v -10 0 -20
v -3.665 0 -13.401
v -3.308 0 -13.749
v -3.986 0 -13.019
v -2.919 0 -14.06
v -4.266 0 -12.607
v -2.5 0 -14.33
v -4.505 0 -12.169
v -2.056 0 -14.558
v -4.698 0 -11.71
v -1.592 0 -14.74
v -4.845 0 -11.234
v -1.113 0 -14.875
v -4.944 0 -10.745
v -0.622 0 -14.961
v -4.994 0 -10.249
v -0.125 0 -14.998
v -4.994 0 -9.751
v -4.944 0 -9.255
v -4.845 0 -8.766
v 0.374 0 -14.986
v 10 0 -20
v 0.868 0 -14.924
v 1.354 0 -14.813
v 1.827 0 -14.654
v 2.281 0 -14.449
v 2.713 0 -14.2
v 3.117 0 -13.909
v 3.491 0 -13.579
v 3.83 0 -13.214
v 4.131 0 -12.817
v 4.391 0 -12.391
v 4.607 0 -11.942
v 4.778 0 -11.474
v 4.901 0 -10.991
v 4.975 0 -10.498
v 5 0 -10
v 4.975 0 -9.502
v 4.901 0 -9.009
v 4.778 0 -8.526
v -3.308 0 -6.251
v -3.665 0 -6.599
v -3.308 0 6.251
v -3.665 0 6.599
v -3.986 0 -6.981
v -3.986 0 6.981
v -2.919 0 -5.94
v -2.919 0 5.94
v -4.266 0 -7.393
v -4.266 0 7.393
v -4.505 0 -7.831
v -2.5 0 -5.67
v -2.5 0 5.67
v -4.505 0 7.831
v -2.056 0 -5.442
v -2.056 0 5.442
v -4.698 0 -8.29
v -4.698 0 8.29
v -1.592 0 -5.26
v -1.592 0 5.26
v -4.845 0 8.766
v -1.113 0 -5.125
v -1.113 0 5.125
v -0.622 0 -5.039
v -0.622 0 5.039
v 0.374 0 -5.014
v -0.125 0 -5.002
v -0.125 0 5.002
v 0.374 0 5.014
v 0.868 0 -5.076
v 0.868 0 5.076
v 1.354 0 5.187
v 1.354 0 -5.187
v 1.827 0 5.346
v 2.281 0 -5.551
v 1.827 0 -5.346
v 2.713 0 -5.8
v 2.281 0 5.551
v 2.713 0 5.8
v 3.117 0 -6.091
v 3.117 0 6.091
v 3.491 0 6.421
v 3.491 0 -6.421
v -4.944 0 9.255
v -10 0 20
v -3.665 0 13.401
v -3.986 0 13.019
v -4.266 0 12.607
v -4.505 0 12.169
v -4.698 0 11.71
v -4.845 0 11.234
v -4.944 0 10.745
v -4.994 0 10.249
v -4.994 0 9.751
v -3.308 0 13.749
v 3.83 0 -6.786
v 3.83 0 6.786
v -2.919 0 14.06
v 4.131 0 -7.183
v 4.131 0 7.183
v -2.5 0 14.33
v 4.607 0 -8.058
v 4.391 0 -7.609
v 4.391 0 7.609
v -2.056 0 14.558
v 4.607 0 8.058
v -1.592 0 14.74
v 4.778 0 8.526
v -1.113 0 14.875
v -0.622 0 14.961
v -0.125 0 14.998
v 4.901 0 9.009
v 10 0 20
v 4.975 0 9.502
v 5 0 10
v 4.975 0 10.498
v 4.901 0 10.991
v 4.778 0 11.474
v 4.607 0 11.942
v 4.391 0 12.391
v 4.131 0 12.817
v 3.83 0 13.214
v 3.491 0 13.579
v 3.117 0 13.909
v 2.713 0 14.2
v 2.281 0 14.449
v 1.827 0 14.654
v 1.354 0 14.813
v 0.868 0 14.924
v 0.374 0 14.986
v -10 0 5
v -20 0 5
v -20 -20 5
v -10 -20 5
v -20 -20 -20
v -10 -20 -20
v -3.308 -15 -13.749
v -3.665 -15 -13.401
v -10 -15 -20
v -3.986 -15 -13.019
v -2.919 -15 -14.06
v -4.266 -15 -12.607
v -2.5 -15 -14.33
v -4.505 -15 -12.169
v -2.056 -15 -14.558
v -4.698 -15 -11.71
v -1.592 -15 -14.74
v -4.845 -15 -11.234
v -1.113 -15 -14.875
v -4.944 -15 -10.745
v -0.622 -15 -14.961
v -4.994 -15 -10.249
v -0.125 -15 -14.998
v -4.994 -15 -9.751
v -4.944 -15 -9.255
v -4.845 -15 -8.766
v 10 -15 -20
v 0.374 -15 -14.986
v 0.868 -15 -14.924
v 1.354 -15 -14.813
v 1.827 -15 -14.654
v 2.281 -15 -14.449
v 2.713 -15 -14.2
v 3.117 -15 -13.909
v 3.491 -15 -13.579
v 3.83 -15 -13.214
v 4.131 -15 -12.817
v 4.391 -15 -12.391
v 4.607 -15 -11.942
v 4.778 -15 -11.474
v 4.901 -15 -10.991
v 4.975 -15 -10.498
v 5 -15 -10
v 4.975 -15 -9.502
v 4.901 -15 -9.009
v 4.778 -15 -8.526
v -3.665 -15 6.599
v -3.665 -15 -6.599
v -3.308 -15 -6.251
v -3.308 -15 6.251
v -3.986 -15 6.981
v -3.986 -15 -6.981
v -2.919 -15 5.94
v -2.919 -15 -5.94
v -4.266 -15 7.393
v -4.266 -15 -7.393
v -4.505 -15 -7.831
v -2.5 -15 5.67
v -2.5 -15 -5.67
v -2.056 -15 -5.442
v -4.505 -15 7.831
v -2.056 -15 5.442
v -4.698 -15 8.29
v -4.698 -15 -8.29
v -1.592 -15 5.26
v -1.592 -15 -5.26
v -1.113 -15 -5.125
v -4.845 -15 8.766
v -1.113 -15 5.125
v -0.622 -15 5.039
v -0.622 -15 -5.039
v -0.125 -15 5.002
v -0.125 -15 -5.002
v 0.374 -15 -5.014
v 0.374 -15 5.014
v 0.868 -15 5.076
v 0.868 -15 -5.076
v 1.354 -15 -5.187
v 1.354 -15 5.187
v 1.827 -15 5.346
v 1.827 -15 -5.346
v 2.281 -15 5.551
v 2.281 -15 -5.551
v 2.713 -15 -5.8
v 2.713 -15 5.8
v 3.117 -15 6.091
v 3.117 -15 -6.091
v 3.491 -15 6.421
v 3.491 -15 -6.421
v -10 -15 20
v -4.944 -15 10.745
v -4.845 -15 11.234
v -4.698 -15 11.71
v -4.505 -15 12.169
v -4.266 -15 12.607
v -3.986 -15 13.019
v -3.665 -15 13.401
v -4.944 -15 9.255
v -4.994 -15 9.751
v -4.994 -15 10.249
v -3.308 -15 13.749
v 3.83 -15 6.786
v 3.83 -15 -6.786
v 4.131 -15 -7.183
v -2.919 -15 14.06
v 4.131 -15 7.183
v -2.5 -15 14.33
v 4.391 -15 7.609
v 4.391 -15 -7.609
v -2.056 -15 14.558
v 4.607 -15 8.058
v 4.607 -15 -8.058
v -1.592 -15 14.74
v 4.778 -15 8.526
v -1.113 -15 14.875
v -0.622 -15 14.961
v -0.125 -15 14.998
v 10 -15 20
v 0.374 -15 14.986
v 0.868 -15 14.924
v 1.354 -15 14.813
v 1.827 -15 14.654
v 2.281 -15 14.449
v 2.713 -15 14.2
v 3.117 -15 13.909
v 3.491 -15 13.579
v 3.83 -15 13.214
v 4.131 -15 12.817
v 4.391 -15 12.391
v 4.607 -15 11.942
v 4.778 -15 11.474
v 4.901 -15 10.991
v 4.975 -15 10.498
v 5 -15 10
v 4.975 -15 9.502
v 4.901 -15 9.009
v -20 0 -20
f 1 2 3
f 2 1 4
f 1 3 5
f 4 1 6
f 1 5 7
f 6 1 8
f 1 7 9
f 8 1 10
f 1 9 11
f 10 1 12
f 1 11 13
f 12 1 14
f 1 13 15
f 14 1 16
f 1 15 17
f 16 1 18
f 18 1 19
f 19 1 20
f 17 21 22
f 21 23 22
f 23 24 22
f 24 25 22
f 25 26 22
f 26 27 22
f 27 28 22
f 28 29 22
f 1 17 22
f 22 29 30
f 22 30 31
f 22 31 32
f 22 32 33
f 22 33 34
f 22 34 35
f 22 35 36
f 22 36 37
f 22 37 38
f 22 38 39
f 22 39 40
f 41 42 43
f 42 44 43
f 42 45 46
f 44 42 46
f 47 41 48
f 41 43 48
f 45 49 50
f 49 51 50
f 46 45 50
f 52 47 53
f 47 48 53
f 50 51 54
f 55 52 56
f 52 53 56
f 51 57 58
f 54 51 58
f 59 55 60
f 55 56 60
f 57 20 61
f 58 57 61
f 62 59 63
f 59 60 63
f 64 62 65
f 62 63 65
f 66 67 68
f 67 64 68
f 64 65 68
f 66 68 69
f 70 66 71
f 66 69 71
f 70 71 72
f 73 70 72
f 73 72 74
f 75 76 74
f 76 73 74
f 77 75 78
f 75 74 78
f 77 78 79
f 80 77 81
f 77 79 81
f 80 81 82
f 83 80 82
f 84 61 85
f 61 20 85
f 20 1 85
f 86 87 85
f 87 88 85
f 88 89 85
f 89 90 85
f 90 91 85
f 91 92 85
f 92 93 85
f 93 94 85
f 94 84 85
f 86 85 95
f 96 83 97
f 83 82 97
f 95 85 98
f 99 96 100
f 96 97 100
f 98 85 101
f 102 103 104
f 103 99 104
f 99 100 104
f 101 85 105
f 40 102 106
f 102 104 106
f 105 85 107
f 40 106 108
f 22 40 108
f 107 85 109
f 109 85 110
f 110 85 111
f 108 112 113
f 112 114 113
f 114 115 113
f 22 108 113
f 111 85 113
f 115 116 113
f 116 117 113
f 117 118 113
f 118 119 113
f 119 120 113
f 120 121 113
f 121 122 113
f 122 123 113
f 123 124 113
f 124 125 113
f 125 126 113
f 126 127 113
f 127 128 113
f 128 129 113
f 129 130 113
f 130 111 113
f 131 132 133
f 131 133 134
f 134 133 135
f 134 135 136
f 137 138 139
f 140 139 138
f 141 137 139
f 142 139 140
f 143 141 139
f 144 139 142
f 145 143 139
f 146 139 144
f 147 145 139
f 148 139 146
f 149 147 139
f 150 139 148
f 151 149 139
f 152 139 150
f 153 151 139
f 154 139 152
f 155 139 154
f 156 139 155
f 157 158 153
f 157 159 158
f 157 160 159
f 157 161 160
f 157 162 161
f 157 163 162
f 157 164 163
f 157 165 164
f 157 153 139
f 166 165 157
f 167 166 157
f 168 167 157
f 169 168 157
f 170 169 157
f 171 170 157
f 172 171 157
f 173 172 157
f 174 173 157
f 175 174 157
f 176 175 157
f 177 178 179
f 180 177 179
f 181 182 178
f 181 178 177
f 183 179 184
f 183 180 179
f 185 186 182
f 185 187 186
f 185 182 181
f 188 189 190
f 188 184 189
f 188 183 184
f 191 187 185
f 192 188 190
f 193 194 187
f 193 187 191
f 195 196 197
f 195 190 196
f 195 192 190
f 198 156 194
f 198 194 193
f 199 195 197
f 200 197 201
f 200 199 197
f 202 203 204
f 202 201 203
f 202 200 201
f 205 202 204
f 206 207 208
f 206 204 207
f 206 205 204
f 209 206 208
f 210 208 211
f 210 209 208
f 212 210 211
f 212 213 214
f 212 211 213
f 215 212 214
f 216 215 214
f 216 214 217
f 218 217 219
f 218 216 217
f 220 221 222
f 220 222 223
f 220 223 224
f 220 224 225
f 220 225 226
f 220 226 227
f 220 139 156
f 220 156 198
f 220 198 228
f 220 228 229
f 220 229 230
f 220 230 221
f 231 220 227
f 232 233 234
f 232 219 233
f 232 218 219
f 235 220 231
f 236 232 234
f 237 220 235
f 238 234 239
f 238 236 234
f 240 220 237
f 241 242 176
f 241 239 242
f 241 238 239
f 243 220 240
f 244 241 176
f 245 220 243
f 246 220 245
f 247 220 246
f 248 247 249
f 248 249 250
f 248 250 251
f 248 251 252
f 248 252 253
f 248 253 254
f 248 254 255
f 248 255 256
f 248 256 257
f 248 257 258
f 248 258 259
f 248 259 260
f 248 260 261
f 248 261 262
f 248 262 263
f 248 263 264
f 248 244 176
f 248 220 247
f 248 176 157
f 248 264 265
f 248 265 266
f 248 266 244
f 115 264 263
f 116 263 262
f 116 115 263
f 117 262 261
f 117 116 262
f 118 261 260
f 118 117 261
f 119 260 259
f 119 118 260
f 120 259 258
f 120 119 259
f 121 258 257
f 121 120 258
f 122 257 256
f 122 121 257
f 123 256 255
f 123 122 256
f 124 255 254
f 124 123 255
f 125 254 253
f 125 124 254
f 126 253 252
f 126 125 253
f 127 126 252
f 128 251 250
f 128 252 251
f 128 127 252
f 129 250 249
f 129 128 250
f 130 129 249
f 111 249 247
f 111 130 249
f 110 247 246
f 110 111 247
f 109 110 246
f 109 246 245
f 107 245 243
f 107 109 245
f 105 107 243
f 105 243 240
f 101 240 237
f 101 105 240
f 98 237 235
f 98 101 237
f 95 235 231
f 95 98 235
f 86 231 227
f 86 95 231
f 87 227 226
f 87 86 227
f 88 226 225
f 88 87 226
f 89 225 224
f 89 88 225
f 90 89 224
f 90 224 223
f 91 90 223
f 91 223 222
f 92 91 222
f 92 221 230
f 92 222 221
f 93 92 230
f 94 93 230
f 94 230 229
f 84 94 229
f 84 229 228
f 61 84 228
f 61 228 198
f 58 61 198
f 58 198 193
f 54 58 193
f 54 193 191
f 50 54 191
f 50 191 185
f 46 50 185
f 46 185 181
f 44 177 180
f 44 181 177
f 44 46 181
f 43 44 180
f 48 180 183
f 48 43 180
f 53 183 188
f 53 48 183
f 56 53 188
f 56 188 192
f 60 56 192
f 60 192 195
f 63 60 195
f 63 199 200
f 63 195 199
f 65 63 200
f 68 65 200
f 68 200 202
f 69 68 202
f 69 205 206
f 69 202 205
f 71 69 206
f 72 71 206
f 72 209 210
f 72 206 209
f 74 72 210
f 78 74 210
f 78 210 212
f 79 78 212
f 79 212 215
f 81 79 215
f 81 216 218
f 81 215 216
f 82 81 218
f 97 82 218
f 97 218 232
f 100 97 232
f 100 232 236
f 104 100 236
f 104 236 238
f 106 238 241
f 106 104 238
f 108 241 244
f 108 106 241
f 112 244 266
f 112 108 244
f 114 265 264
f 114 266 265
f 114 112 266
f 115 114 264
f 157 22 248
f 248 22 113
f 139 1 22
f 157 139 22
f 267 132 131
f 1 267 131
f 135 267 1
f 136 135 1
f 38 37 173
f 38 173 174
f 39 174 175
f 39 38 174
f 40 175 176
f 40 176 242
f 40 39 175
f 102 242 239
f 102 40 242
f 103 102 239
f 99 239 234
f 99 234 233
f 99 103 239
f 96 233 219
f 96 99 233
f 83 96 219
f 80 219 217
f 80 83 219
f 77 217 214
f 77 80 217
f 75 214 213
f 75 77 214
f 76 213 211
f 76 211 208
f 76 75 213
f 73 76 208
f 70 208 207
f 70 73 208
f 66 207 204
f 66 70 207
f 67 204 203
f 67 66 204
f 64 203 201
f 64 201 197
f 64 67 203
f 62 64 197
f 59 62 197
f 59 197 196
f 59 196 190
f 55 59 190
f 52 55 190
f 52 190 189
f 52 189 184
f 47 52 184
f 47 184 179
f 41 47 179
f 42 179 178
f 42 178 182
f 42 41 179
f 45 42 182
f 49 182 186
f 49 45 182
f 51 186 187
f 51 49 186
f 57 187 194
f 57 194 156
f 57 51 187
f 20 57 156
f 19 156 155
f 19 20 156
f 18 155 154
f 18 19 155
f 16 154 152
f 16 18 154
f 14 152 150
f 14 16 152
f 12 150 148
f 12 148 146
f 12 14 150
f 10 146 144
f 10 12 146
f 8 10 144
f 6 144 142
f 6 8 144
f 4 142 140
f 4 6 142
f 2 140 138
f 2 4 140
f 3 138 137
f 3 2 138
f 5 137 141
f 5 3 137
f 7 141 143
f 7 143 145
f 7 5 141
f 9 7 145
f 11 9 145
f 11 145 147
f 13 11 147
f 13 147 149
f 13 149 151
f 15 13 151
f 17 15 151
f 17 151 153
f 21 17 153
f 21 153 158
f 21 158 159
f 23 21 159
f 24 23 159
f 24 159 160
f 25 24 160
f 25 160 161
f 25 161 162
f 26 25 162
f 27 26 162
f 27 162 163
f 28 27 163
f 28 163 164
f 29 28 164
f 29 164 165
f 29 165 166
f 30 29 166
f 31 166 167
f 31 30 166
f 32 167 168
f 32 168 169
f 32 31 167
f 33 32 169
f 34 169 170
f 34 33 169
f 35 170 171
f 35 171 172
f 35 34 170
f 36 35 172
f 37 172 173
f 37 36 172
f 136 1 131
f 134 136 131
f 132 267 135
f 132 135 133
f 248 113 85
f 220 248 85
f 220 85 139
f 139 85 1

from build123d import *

# Parameters (mm, degrees)
F0_R     = 5
F1_DEPTH = 15
F0_W     = 10
F0_H     = 25
F2_DEPTH = 20
F3_R     = 5
F4_DEPTH = 25


with BuildPart() as f1:
    # F0 (on Front) → F1 (new body)
    with BuildSketch(Plane.XZ):
        Polygon((10, -20), (10, 20), (-10, 20), (-10, 5), (-10, -20), align=None)
        with Locations((0, -10)):
            Circle(F0_R, mode=Mode.SUBTRACT)
    extrude(amount=F1_DEPTH)

    # F3 (on Front) → F4 (cut)
    with BuildSketch(Plane.XZ):
        with Locations((0, 10)):
            Circle(F3_R)
    extrude(amount=F4_DEPTH, mode=Mode.SUBTRACT)


with BuildPart() as f2:
    # F0 (on Front) → F2 (new body)
    with BuildSketch(Plane.XZ):
        with Locations((-15, -7.5)):
            Rectangle(F0_W, F0_H)
    extrude(amount=F2_DEPTH)


solid = Compound([f1.part, f2.part])
